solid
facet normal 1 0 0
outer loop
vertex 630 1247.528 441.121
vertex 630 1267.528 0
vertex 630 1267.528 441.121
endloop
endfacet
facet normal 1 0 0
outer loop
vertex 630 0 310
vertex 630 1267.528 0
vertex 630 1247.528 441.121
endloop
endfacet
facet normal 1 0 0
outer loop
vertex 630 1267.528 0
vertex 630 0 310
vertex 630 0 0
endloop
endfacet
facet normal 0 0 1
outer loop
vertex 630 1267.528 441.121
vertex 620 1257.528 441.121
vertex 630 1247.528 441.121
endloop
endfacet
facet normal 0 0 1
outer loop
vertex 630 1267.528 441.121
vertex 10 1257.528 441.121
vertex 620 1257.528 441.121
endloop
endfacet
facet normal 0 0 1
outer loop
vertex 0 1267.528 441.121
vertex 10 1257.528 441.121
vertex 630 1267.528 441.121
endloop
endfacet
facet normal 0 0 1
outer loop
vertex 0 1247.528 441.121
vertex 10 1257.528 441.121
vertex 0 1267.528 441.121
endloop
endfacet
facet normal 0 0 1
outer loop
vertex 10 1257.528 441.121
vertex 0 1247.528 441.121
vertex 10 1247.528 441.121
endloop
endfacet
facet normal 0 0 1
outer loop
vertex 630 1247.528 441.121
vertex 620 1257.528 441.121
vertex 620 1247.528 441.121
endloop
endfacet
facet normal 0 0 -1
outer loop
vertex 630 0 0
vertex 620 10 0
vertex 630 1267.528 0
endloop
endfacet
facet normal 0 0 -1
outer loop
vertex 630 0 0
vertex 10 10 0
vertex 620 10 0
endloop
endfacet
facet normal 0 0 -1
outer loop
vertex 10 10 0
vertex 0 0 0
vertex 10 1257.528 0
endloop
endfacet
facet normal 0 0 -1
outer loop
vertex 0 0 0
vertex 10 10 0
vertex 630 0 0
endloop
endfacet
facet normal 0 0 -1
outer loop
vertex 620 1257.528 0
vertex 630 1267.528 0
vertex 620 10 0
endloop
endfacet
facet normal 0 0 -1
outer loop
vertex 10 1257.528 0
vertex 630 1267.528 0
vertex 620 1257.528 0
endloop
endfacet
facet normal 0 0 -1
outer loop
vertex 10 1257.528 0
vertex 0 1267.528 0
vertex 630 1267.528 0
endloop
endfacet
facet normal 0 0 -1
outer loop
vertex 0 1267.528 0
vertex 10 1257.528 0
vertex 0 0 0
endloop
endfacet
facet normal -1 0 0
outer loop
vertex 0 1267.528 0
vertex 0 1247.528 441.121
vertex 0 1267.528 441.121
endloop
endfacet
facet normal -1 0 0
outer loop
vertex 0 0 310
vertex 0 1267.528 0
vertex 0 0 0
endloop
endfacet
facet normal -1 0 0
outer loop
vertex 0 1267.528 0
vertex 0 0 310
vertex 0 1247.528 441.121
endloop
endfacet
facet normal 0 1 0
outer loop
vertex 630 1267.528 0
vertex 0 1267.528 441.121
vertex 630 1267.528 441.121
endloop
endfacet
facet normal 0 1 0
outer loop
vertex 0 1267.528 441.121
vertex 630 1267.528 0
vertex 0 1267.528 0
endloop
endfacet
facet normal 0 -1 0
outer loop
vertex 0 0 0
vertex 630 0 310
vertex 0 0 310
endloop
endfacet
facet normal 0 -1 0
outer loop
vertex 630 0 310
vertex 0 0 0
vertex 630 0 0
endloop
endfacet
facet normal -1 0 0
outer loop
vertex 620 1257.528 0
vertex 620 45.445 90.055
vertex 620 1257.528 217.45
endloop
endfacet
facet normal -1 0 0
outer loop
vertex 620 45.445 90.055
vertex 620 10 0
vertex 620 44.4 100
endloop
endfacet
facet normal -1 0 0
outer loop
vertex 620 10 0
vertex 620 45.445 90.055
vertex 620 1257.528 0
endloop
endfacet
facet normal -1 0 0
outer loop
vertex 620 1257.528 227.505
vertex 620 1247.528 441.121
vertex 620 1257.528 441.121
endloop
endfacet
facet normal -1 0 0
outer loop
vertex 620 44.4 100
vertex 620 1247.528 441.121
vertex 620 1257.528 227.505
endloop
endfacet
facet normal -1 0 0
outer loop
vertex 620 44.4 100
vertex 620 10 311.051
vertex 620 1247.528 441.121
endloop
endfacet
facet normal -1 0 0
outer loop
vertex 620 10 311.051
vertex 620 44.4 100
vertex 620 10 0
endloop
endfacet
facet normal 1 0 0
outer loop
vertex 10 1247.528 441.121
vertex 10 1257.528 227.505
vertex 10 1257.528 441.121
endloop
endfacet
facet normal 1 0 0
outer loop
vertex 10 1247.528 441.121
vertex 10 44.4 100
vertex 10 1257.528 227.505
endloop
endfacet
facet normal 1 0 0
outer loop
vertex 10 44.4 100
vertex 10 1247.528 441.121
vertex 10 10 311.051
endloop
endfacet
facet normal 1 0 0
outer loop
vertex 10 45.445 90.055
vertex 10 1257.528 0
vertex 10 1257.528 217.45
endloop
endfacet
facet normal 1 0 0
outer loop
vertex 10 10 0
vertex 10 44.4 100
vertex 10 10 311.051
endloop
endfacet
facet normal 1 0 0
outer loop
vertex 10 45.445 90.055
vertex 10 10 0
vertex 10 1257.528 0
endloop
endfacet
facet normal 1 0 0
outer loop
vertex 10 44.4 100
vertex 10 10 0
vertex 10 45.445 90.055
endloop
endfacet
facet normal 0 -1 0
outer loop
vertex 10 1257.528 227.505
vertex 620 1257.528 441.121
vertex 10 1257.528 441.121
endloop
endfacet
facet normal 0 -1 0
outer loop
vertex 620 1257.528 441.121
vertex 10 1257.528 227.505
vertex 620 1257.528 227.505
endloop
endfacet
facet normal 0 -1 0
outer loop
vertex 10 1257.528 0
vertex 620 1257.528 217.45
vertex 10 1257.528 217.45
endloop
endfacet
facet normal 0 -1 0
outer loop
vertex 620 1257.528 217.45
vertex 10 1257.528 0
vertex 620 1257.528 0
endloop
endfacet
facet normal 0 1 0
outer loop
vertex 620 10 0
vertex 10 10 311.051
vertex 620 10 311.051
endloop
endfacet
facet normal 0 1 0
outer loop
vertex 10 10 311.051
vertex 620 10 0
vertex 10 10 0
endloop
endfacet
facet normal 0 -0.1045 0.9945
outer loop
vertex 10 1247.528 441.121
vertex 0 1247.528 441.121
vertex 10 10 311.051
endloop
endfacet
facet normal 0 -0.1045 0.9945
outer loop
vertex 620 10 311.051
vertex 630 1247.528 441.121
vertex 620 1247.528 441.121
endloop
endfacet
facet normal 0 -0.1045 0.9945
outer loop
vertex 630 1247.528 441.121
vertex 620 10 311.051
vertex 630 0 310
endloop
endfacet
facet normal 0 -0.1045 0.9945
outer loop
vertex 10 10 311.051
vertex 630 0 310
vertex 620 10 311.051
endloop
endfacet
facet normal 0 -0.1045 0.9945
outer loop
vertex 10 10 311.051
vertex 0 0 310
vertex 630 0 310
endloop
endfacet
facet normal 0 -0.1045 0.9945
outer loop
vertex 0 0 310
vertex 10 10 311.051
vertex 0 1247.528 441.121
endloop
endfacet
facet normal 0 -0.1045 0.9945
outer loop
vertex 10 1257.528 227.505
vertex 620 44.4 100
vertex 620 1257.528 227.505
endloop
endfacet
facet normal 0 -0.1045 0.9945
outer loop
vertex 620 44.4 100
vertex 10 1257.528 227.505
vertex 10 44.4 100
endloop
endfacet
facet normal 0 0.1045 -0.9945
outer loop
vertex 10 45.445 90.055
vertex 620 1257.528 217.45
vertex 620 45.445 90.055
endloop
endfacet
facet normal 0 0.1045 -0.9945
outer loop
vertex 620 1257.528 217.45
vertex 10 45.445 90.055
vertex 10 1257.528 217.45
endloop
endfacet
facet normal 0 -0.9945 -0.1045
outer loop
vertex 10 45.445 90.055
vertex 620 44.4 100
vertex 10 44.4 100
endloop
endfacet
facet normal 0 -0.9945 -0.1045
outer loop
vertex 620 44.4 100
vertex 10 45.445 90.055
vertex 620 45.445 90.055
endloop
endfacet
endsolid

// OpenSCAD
// file: physical_dimensions.scad
//Physically bound settings.
printing_play = 0.2; //Horizontal error in 3D printing.
printing_overhang = 50; //Maximum overhang angle. 90 is perfect bridging. 0 is no overhang possible.
movement_play = 0.2; //Play to leave if stuff has to move past each other.

m3_bolt_radius = 1.5;
m3_nut_radius = 5.5 / 2;
m3_nut_height = 2.4;

ball_radius = 15; //Standard pinball size (7/6 inch).

cabinet_thickness = 10; //1cm wooden planks.

flipper_solenoid_width = 13;
flipper_solenoid_height = 15;
flipper_solenoid_length = 30;
flipper_solenoid_pin_radius = 2;
flipper_solenoid_pin_retracted = 8.5; //Length when retracted.
flipper_solenoid_pin_expansion = 10; //Additional length when expanded.
flipper_solenoid_pinhole_position = 2.5; //Distance from centre of hole to tip of pin.
flipper_solenoid_pinhole_radius = m3_bolt_radius;
flipper_solenoid_pingap_thickness = 1.6;
flipper_solenoid_pingap_depth = 7;
flipper_solenoid_screw_radius = m3_bolt_radius;
flipper_solenoid_screw1_position = 8; //Distance from front.
flipper_solenoid_screw2_position = 15 + flipper_solenoid_screw1_position;
flipper_solenoid_screw_depth = 4; //Unknown.

hexkey_radius = 2; //Radius of circumscribed circle around hex key.
hexkey_short_length = 30; //Length of short end.//TODO: How long is this?
hexkey_long_length = 100; //TODO: How long is this?
hexkey_turn_radius = 10; //TODO: Also unknown.


playfield_thickness = 10; //TODO: Haven't chosen a playfield yet.

spring_end_thickness = 2; //How thick the attachment part of the spring is.
spring_radius = 4; //Radius of the coil of the spring.
// main file
include <physical_dimensions.scad>

//Preferences.
playfield_width = 610;
playfield_height = 1220;
playfield_slope = 6; //Degrees.
space_bottom = 100;
space_top = 200;
ball_slit = ball_radius * 2 + movement_play * 2 + 4; //Allow 4mm extra space to make the ball fall through faster.

module cabinet() {
	difference() {
		cube([playfield_width + cabinet_thickness * 2, cos(playfield_slope) * (playfield_height + ball_slit) + cabinet_thickness * 2, sin(playfield_slope) * (playfield_height + ball_slit) + space_bottom + playfield_thickness + space_top]);
		translate([cabinet_thickness, cabinet_thickness, 0]) {
			cube([playfield_width, cos(playfield_slope) * (playfield_height + ball_slit), sin(playfield_slope) * (playfield_height + ball_slit) + space_bottom + playfield_thickness + space_top]);
		}
		translate([0, 0, space_bottom + space_top + playfield_thickness]) {
			rotate([playfield_slope, 0, 0]) {
				cube([playfield_width + cabinet_thickness * 2, playfield_height * 2, space_top + sin(playfield_slope) * playfield_height]);
			}
		}
	}
	translate([cabinet_thickness, cabinet_thickness + ball_slit, space_bottom]) {
		rotate([playfield_slope, 0, 0]) {
			translate([0, 0, -playfield_thickness]) {
				cube([playfield_width, playfield_height, playfield_thickness]);
			}
		}
	}
}

cabinet();
